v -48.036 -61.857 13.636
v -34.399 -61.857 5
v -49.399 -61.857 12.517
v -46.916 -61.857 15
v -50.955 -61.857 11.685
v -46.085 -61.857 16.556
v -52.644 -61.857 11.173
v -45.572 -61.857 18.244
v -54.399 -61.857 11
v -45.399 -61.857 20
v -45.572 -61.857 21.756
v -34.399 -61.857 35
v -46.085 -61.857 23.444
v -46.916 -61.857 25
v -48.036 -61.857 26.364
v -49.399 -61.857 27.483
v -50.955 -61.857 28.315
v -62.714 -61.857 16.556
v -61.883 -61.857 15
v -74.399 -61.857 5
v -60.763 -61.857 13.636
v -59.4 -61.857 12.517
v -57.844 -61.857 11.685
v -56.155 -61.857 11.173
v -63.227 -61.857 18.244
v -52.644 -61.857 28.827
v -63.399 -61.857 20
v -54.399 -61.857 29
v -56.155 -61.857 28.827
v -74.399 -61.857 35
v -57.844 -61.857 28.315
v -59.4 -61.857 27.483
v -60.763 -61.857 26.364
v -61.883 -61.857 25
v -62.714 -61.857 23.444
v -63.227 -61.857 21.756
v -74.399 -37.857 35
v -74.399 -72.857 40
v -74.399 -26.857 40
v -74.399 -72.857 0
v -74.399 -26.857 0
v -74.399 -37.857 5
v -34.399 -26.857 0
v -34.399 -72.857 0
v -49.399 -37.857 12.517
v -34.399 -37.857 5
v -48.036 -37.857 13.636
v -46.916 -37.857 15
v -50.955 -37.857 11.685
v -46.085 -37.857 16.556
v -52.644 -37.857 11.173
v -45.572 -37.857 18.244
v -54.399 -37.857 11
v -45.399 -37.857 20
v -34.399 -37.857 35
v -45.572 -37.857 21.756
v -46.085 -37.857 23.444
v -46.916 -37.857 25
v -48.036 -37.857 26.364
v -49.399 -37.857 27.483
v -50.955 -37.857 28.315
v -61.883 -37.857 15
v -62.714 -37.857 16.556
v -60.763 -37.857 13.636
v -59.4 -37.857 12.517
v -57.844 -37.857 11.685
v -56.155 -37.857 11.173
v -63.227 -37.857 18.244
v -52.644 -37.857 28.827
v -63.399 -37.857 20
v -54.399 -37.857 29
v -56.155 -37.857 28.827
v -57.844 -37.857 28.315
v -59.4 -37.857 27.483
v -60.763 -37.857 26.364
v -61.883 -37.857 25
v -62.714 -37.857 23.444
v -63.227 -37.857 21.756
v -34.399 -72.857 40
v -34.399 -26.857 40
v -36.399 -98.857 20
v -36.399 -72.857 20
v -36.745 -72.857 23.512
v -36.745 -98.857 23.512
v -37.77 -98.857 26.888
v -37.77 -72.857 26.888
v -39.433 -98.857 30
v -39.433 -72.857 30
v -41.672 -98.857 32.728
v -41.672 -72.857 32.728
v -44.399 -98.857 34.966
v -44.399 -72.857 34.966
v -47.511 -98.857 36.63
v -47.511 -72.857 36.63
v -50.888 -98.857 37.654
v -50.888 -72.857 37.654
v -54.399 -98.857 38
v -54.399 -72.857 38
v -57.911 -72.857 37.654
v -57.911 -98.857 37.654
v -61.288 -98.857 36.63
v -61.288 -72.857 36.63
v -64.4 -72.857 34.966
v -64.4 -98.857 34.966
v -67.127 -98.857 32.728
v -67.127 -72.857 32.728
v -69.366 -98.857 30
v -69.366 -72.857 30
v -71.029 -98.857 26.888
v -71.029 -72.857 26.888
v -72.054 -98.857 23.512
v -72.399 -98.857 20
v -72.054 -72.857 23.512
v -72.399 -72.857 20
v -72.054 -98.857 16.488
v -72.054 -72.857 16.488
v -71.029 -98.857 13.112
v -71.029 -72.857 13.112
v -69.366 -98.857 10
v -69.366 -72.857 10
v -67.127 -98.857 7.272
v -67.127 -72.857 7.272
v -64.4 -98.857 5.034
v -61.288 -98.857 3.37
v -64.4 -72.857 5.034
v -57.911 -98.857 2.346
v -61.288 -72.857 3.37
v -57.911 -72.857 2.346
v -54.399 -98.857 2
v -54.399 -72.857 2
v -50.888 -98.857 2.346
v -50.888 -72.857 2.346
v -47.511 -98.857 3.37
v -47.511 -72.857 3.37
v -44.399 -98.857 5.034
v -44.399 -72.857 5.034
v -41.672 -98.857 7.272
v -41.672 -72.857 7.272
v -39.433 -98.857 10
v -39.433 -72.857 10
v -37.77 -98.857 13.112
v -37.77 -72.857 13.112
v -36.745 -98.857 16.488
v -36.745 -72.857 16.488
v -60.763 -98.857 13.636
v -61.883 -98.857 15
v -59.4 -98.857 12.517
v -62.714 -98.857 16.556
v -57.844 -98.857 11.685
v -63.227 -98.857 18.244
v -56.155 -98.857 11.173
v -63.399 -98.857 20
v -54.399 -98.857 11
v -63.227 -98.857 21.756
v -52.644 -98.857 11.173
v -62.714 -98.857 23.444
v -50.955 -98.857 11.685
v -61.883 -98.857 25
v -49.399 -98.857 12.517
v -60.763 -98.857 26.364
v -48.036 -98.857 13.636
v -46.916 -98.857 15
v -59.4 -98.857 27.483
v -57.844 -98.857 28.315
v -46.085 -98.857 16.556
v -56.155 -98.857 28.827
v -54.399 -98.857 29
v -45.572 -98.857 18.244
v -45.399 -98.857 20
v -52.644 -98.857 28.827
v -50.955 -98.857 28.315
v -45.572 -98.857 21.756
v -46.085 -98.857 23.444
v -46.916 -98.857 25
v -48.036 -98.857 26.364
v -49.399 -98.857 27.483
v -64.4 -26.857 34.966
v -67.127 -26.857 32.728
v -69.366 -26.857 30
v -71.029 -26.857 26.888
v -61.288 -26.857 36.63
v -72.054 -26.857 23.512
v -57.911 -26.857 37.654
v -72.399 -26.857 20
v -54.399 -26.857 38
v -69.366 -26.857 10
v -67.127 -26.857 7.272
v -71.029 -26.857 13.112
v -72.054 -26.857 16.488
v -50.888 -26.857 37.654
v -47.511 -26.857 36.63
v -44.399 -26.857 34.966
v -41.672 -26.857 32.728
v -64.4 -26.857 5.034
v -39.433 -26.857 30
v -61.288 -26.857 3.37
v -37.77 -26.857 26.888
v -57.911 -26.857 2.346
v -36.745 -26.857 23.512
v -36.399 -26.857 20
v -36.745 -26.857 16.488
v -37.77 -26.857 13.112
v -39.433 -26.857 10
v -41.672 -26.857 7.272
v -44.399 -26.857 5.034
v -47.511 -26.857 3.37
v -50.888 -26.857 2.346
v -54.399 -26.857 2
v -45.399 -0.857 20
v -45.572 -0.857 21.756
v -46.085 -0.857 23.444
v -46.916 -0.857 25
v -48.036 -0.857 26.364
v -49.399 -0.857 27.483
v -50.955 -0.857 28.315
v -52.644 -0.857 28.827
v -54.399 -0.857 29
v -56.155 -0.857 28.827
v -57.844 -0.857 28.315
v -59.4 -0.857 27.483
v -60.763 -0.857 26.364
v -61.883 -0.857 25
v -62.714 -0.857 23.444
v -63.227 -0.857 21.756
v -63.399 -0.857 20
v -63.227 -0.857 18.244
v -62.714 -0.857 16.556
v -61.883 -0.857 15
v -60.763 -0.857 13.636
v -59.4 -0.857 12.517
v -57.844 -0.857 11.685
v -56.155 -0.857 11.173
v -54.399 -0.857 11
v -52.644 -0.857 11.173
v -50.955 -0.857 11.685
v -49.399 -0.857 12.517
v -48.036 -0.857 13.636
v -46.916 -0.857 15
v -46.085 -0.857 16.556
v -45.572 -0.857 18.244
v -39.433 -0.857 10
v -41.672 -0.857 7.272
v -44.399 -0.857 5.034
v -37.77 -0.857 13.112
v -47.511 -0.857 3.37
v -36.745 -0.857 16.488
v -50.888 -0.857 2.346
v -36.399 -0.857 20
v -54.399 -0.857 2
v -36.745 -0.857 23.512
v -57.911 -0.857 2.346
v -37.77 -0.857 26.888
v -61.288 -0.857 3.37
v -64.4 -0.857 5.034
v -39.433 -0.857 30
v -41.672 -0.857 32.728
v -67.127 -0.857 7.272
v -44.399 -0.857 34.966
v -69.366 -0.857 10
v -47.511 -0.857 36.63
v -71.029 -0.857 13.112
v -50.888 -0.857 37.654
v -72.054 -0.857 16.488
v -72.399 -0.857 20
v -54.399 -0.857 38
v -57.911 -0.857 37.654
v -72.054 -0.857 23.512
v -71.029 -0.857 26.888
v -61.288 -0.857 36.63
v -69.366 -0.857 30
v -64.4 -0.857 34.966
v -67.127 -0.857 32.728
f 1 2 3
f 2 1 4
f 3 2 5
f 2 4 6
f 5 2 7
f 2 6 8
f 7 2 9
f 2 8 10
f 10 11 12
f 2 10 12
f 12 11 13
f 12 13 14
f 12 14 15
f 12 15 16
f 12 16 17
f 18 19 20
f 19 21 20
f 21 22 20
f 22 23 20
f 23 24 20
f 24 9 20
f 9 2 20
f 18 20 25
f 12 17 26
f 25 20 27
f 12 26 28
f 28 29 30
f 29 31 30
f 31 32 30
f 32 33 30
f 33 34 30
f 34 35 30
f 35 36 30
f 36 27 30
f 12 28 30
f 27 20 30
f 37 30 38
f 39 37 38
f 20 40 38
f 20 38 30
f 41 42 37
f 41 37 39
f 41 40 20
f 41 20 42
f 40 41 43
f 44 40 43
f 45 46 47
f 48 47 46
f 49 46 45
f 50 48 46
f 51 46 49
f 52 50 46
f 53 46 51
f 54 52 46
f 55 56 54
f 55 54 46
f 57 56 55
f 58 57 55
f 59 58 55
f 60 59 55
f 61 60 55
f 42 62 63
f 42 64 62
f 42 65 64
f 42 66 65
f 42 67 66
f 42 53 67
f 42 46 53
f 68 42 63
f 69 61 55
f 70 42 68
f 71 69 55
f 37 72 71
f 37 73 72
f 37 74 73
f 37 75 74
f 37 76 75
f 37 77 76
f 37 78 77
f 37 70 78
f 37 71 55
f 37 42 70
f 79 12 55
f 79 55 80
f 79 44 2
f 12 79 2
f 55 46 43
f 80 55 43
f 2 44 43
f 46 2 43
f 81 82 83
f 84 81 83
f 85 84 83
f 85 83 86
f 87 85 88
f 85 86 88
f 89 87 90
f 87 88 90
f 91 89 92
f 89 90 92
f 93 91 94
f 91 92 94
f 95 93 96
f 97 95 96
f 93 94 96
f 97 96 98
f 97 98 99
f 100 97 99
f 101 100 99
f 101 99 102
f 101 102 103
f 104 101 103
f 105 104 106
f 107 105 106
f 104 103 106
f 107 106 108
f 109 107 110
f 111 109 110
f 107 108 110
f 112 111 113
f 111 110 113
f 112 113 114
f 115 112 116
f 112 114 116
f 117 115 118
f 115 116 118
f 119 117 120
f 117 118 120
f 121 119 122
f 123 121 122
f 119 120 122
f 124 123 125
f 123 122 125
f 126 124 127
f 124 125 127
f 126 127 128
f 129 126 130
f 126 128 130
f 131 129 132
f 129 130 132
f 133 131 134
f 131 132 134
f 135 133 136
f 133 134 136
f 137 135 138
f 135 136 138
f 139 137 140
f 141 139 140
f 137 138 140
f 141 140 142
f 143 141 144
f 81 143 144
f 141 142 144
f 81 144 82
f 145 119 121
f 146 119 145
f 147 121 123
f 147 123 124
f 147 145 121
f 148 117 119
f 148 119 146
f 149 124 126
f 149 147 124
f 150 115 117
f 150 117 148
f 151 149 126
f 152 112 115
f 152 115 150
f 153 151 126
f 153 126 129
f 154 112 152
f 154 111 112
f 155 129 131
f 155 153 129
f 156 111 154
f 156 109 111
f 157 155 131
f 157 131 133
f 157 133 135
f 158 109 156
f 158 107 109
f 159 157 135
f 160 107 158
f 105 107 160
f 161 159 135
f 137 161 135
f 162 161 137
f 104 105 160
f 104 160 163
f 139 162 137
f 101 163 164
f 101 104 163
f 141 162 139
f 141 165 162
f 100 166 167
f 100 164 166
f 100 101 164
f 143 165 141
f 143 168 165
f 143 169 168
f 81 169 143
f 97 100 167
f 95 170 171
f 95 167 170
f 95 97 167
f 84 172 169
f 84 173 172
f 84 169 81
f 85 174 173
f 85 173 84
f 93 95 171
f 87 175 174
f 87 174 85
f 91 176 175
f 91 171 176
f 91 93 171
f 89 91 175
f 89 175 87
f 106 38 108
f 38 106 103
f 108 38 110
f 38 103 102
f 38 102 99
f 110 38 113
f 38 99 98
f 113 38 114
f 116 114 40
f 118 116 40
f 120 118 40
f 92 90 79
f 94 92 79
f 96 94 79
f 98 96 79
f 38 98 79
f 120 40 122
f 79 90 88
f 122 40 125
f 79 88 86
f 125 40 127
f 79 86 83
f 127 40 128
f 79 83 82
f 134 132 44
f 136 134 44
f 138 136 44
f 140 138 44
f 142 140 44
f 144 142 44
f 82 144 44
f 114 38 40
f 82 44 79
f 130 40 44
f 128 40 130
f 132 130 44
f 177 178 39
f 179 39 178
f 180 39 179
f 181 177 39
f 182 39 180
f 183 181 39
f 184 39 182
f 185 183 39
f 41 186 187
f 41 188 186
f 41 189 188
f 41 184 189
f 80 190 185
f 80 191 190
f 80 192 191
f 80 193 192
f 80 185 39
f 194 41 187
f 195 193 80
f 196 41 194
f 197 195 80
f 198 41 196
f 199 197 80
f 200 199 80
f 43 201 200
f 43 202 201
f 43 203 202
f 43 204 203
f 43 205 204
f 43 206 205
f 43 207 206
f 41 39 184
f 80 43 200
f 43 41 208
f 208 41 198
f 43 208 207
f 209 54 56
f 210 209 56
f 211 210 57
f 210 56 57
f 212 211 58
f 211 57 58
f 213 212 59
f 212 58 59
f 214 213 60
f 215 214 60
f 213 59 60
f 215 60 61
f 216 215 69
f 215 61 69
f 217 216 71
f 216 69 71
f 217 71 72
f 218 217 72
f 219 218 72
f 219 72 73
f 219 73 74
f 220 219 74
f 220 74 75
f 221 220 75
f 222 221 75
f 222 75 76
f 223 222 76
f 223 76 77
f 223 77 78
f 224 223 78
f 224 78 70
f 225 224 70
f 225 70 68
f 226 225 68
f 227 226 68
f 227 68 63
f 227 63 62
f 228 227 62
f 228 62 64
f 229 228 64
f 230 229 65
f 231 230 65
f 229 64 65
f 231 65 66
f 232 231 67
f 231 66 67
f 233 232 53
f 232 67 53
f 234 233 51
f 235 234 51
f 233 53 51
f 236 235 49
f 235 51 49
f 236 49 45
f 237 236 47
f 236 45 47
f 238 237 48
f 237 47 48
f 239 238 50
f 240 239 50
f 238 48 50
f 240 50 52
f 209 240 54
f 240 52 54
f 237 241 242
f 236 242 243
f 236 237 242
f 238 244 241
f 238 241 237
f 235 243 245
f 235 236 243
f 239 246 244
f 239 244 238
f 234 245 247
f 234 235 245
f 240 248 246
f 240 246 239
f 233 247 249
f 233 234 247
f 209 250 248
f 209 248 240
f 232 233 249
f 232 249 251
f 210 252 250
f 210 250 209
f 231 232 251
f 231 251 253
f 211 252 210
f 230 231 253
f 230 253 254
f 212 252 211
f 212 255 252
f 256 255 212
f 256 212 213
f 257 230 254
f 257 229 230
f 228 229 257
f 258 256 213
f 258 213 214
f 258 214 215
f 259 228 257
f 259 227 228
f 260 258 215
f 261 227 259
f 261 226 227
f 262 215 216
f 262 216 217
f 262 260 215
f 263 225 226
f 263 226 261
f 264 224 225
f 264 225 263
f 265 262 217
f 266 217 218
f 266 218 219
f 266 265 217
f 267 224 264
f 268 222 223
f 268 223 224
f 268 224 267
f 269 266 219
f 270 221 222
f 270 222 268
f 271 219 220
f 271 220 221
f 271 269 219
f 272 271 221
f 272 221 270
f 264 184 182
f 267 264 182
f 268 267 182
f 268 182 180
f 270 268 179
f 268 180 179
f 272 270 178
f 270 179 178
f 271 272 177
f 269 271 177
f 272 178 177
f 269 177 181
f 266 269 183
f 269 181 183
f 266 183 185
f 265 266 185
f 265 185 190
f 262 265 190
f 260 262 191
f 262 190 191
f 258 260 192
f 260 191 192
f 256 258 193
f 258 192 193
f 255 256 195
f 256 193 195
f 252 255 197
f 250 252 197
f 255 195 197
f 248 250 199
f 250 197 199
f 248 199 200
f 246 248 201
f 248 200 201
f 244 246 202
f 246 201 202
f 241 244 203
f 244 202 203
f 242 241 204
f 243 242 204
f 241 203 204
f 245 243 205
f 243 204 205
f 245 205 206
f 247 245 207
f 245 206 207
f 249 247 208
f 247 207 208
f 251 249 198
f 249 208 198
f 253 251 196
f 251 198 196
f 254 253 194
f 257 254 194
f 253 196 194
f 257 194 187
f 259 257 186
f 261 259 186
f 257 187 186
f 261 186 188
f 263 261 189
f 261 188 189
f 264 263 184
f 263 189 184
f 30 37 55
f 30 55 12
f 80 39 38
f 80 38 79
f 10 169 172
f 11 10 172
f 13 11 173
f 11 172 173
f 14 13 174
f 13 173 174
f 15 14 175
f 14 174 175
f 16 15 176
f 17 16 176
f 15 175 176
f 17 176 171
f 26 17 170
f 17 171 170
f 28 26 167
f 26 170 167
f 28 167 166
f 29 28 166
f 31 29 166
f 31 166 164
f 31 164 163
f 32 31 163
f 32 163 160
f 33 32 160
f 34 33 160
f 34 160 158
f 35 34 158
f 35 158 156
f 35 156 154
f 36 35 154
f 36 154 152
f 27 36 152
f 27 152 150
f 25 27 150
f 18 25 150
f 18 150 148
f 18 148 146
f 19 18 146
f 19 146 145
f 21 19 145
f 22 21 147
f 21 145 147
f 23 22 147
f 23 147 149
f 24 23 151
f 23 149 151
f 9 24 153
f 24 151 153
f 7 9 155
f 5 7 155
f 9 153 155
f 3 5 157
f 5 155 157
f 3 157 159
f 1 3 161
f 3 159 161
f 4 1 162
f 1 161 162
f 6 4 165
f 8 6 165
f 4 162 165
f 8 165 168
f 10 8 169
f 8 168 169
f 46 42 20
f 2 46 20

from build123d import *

# Parameters (mm, degrees)
F0_W     = 40
F0_H     = 46
F1_DEPTH = 40
F2_R     = 18
F3_DEPTH = 26
F4_R     = 18
F5_DEPTH = 26
F8_D     = 18
F6_W     = 24
F6_H     = 30
F9_DEPTH = 50


with BuildPart() as f1:
    # F0 (on Top) → F1 (new body)
    with BuildSketch(Plane.XY):
        with Locations((-54.399494, -49.857425)):
            Rectangle(F0_W, F0_H)
    extrude(amount=F1_DEPTH)

    # F2 (on face) → F3 (join)
    with BuildSketch(Plane.XZ.offset(72.857425)):
        with Locations((-54.399494, 20)):
            Circle(F2_R)
    extrude(amount=F3_DEPTH)

    # F4 (on face) → F5 (join)
    with BuildSketch(Plane(origin=(0, -26.857425, 0), x_dir=(-1, 0, 0), z_dir=(0, 1, 0))):
        with Locations((54.399494, 20)):
            Circle(F4_R)
    extrude(amount=F5_DEPTH)

    # F8 (through all)
    with Locations(Plane(origin=(0, -0.857425, 0), x_dir=(-1, 0, 0), z_dir=(0, 1, 0))):
        with Locations((54.399494, 20)):
            Hole(F8_D / 2)

    # F6 (on face) → F9 (cut)
    with BuildSketch(Plane(origin=(-74.399494, 0, 0), x_dir=(0, -1, 0), z_dir=(-1, 0, 0))):
        with Locations((49.857425, 20)):
            Rectangle(F6_W, F6_H)
    extrude(amount=-F9_DEPTH, mode=Mode.SUBTRACT)


solid = f1.part
